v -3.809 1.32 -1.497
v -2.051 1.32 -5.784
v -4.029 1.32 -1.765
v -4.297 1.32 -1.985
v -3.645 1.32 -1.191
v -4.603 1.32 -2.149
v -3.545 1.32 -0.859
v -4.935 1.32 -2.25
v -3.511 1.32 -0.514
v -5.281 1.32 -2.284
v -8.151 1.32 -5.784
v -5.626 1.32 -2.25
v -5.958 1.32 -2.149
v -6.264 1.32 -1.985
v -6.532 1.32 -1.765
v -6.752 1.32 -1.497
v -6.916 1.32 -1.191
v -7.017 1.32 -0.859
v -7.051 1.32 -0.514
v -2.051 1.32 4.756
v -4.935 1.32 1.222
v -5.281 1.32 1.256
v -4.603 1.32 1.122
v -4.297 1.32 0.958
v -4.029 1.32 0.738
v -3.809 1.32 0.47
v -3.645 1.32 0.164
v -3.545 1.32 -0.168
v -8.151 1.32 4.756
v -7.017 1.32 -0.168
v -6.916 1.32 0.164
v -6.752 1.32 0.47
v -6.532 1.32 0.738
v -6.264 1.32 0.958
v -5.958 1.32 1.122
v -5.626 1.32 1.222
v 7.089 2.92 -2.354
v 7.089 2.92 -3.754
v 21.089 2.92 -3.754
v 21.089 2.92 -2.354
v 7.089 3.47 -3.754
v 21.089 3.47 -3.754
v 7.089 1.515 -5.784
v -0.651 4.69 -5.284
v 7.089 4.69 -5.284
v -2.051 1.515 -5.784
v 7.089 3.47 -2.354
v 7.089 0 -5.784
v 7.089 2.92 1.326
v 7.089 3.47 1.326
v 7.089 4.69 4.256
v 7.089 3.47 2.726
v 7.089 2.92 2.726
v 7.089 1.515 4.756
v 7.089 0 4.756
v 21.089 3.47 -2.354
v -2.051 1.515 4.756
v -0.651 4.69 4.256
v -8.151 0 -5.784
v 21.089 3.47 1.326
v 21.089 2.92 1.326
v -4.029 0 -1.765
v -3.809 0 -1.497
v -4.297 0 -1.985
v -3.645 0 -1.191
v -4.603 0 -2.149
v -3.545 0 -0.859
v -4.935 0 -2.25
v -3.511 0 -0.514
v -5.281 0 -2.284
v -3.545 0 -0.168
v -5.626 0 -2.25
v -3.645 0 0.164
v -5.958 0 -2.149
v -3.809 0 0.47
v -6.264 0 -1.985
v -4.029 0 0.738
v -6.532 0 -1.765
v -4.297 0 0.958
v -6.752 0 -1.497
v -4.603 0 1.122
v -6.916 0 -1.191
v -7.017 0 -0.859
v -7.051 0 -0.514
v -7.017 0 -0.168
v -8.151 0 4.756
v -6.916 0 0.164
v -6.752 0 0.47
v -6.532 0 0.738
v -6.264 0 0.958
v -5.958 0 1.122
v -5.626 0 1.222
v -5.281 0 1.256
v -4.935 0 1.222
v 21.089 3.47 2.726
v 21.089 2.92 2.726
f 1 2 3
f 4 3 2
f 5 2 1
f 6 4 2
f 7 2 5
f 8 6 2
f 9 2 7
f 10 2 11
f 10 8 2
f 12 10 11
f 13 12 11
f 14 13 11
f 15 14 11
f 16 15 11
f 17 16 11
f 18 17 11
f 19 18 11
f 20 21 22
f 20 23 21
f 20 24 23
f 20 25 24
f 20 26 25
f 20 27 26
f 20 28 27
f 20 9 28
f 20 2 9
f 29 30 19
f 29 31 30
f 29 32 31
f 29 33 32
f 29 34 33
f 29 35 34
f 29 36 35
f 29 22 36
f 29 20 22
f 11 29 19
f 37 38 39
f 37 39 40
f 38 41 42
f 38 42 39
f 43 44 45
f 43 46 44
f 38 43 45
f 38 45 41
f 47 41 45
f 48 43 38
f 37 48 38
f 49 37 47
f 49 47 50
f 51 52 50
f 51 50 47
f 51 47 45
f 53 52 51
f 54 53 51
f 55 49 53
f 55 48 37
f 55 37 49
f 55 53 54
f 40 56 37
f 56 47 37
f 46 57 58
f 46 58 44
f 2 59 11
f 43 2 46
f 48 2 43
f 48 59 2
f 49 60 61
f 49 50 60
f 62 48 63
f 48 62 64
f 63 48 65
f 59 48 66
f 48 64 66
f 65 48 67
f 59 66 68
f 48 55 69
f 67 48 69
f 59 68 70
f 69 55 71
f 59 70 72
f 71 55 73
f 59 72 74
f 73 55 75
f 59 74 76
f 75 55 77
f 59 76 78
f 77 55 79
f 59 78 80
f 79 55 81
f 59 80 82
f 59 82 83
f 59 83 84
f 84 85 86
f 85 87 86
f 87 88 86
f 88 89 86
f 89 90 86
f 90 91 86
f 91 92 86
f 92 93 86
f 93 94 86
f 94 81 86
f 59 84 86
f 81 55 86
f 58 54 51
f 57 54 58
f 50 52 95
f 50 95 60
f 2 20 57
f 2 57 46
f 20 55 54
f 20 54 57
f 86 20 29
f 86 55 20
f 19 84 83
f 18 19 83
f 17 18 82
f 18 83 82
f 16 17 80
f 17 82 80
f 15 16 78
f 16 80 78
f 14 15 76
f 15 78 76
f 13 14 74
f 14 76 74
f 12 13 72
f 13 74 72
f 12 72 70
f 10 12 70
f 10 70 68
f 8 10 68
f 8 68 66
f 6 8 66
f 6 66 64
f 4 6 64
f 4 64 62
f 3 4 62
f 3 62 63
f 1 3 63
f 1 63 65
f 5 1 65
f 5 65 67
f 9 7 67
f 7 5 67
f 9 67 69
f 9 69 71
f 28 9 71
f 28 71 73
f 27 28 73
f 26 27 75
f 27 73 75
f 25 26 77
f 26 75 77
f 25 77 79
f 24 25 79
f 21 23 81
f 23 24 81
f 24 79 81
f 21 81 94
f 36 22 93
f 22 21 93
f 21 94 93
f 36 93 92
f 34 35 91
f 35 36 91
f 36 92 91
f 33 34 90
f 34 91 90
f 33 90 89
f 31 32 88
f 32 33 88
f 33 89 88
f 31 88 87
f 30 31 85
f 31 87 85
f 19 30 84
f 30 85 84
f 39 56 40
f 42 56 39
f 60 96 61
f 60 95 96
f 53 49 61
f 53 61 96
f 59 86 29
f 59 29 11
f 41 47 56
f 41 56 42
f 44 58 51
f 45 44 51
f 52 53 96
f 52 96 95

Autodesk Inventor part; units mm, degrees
ref_plane "YZ Plane" through (0, 0, 0) normal (1, 0, 0) x (0, 1, 0)
ref_plane "XZ Plane" through (0, 0, 0) normal (0, 1, 0) x (-1, 0, 0)
ref_plane "XY Plane" through (0, 0, 0) normal (0, 0, 1) x (1, 0, 0)
sketch "Sketch1" plane through (0, 0, 0) normal (0, 1, 0) x (-1, 0, 0)
  line L0 (-7.0894, 4.7564) -> (8.1506, 4.7564)
  line L1 (8.1506, 4.7564) -> (8.1506, -5.7836)
  line L2 (8.1506, -5.7836) -> (-7.0894, -5.7836)
  line L3 (-7.0894, -5.7836) -> (-7.0894, 4.7564)
  circle A0 centre (5.2806, -0.5136) radius 1.77
  point P0 (0, 0)
  dimension "d0" = 10.54
  dimension "d1" = 15.24
  dimension "d2" = 3.54
  dimension "d3" = 2.87
  dimension "d4" = 5.27
extrude "Extrusion1" add sketch "Sketch1" along normal blind 1.32
sketch "Sketch2" plane through (0, 1.32, 0) normal (0, 1, 0) x (1, 0, 0)
  line L0 (7.0894, 5.7836) -> (-8.1506, 5.7836) projected
  line L1 (-2.0506, 5.7836) -> (7.0894, 5.7836)
  line L2 (7.0894, 5.7836) -> (7.0894, -4.7564)
  line L3 (7.0894, -4.7564) -> (-2.0506, -4.7564)
  line L4 (-2.0506, -4.7564) -> (-2.0506, 5.7836)
  point P0 (0, 0)
  dimension "d7" = 9.14
extrude "Extrusion2" add sketch "Sketch2" along normal blind 3.37
chamfer "Chamfer1" distance 1.4 distance2 3.175 1 edges at (-2.0506, 4.69, -0.5136) measured on face at (0.996, 4.69, -2.2703)
chamfer "Chamfer2" distance 0.5 distance2 3.175 1 edges at (3.2194, 4.69, -5.7836) measured on face at (1.9294, 4.69, -2.2703)
chamfer "Chamfer3" distance 0.5 distance2 3.175 1 edges at (3.2194, 4.69, 4.7564) measured on face at (1.9294, 4.69, -1.9369)
sketch "Sketch4" plane through (7.0894, 0, 4.7564) normal (1, 0, 0) x (0, 0, -1)
  line L0 (0, 0) -> (0, 1.515) projected
  line L1 (10.54, 0) -> (0, 0) projected
  line L2 (2.03, 3.47) -> (8.51, 3.47)
  line L3 (8.51, 3.47) -> (8.51, 2.92)
  line L4 (8.51, 2.92) -> (2.03, 2.92)
  line L5 (2.03, 2.92) -> (2.03, 3.47)
  line L6 (3.43, 3.47) -> (3.43, 2.92)
  line L7 (4.57, 3.47) -> (4.57, 2.92)
  line L8 (5.97, 3.47) -> (5.97, 2.92)
  line L9 (7.11, 3.47) -> (7.11, 2.92)
  point P0 (4.7564, 0)
  dimension "d19" = 0.55
  dimension "d20" = 2.92
  dimension "d21" = 6.48
  dimension "d22" = 1.4
  dimension "d23" = 1.4
  dimension "d24" = 1.4
  dimension "d25" = 2.54
  dimension "d26" = 4.57
extrude "Extrusion3" add sketch "Sketch4" along normal blind 14 contours L2 L6 L4 L5 | L2 L3 L4 L9
properties part number "Diode"
